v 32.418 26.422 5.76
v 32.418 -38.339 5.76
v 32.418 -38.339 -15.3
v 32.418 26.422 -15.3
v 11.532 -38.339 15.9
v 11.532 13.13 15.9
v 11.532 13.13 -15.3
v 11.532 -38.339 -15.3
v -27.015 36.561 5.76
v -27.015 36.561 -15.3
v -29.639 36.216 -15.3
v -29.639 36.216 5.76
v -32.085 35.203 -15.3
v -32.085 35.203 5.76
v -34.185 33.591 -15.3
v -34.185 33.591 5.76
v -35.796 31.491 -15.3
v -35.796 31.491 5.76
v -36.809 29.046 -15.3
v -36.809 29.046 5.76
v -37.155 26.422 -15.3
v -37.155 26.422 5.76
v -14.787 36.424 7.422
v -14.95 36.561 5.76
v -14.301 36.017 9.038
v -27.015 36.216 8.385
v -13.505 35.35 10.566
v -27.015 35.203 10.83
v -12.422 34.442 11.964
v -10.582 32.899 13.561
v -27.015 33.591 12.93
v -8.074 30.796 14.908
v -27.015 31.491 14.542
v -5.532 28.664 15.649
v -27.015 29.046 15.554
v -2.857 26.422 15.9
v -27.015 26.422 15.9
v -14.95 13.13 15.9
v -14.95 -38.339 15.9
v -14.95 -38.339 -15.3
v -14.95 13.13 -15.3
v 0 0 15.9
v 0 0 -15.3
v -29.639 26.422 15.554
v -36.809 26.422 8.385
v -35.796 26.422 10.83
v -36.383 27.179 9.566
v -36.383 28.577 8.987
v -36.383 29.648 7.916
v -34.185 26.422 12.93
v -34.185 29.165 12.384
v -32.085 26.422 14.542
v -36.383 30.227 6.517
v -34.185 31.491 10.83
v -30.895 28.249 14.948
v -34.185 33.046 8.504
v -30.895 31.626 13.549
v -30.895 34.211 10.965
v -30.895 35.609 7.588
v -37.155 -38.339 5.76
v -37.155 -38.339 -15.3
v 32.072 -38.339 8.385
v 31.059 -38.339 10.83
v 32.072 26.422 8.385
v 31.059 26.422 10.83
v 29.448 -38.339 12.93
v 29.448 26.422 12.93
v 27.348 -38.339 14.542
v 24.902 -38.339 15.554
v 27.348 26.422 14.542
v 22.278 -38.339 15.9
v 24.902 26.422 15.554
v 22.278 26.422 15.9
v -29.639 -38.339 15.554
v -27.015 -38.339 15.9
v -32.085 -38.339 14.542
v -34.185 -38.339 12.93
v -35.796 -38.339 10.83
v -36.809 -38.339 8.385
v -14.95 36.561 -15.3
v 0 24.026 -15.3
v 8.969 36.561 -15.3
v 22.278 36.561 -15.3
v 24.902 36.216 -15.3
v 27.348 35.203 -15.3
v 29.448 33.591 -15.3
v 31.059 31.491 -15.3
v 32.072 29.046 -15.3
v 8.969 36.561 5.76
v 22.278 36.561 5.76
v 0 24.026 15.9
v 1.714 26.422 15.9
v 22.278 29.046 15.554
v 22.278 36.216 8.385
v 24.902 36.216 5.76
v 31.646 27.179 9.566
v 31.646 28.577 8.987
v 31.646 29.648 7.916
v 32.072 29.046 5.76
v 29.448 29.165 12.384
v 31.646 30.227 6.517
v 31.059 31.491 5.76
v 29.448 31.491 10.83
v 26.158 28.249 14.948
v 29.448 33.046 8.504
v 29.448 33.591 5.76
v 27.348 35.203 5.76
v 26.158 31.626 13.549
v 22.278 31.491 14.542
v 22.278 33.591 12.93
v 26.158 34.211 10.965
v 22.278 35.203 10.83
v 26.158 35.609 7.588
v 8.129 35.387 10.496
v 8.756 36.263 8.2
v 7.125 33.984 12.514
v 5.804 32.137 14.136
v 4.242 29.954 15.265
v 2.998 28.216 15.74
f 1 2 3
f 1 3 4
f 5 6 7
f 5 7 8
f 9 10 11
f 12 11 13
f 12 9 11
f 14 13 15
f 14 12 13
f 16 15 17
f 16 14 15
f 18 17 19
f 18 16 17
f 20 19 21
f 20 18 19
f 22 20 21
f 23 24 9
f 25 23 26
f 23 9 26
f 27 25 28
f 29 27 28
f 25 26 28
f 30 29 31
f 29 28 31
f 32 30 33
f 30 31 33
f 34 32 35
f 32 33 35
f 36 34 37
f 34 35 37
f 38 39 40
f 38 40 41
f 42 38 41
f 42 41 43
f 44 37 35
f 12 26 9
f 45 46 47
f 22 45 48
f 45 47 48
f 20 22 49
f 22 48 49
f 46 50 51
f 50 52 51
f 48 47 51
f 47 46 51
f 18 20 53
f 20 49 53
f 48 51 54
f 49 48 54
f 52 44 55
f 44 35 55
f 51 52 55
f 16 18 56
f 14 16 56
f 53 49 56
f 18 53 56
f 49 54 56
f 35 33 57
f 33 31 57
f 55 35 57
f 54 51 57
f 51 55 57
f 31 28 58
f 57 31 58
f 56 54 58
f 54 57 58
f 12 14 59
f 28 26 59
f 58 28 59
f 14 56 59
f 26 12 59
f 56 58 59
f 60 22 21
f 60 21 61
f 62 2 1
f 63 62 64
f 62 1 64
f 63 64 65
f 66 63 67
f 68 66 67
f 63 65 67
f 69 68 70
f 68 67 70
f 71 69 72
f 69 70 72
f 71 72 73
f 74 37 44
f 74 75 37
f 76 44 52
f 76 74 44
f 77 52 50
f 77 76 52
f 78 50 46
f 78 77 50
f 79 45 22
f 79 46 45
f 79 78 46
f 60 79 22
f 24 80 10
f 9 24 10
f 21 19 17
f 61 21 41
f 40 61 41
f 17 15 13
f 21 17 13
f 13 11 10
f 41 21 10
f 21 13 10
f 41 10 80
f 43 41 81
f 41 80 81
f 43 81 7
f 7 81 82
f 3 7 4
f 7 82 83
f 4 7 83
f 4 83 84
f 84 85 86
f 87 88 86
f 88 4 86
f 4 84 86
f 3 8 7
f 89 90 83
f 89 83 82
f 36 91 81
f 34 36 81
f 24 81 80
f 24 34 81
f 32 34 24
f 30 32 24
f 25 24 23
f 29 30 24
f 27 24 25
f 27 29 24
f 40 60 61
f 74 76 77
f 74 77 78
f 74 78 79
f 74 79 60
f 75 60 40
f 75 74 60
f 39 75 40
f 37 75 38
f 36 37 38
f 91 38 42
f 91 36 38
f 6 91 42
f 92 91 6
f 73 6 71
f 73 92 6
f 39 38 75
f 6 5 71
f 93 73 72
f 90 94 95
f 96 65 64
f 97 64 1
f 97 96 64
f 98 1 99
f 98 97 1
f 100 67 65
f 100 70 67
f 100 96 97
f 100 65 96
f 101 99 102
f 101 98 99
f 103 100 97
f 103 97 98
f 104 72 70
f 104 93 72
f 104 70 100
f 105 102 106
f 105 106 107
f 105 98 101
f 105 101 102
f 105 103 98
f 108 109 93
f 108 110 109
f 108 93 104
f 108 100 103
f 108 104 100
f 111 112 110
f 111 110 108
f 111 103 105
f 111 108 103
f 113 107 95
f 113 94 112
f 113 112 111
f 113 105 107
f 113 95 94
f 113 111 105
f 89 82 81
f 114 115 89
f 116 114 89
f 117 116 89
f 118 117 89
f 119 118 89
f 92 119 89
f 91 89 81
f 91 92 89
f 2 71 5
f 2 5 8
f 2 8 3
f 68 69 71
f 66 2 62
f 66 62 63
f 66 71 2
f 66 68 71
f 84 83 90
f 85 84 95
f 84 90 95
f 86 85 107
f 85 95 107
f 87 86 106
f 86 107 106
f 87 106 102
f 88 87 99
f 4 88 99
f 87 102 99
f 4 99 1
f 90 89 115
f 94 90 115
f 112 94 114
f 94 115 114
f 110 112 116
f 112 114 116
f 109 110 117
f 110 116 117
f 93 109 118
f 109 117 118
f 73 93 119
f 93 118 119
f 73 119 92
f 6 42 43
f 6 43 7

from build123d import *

# Parameters (mm, degrees)
F1_DEPTH = 15.9
F2_DEPTH = 31.2
F3_R     = 10.139696962


with BuildPart() as f1:
    # F0 (on Top) → F1 (new body)
    with BuildSketch(Plane.XY):
        Polygon((-14.9499792606, 36.5612395108), (-37.1546074748, 36.5612395108), (-37.1546074748, -38.338817656), (-14.9499792606, -38.338817656), (-14.9499792606, 13.1299823828), (0, 0), (11.5315502696, 13.1299823828), (11.5315502696, -38.338817656), (32.4177630246, -38.338817656), (32.4177630246, 36.5612395108), (8.9689589565, 36.5612395108), (0, 24.0256660507), align=None)
    extrude(amount=F1_DEPTH)

    # F2 (add): a face of the model
    f2_faces = [f1.faces().sort_by_distance(p)[0] for p in [
        (-2.5598021431, 2.3799510678, 15.9),
    ]]
    extrude(f2_faces, amount=-F2_DEPTH)

    # F3
    f3_edges = [f1.edges().sort_by_distance(p)[0] for p in [
        (-26.052293, 36.56124, 15.9),
        (20.693361, 36.56124, 15.9),
        (32.417763, -0.888789, 15.9),
        (-37.154607, -0.888789, 15.9),
        (-37.154607, 36.56124, 0.3),
        (32.417763, 36.56124, 0.3),
    ]]
    fillet(f3_edges, radius=F3_R)


solid = f1.part
